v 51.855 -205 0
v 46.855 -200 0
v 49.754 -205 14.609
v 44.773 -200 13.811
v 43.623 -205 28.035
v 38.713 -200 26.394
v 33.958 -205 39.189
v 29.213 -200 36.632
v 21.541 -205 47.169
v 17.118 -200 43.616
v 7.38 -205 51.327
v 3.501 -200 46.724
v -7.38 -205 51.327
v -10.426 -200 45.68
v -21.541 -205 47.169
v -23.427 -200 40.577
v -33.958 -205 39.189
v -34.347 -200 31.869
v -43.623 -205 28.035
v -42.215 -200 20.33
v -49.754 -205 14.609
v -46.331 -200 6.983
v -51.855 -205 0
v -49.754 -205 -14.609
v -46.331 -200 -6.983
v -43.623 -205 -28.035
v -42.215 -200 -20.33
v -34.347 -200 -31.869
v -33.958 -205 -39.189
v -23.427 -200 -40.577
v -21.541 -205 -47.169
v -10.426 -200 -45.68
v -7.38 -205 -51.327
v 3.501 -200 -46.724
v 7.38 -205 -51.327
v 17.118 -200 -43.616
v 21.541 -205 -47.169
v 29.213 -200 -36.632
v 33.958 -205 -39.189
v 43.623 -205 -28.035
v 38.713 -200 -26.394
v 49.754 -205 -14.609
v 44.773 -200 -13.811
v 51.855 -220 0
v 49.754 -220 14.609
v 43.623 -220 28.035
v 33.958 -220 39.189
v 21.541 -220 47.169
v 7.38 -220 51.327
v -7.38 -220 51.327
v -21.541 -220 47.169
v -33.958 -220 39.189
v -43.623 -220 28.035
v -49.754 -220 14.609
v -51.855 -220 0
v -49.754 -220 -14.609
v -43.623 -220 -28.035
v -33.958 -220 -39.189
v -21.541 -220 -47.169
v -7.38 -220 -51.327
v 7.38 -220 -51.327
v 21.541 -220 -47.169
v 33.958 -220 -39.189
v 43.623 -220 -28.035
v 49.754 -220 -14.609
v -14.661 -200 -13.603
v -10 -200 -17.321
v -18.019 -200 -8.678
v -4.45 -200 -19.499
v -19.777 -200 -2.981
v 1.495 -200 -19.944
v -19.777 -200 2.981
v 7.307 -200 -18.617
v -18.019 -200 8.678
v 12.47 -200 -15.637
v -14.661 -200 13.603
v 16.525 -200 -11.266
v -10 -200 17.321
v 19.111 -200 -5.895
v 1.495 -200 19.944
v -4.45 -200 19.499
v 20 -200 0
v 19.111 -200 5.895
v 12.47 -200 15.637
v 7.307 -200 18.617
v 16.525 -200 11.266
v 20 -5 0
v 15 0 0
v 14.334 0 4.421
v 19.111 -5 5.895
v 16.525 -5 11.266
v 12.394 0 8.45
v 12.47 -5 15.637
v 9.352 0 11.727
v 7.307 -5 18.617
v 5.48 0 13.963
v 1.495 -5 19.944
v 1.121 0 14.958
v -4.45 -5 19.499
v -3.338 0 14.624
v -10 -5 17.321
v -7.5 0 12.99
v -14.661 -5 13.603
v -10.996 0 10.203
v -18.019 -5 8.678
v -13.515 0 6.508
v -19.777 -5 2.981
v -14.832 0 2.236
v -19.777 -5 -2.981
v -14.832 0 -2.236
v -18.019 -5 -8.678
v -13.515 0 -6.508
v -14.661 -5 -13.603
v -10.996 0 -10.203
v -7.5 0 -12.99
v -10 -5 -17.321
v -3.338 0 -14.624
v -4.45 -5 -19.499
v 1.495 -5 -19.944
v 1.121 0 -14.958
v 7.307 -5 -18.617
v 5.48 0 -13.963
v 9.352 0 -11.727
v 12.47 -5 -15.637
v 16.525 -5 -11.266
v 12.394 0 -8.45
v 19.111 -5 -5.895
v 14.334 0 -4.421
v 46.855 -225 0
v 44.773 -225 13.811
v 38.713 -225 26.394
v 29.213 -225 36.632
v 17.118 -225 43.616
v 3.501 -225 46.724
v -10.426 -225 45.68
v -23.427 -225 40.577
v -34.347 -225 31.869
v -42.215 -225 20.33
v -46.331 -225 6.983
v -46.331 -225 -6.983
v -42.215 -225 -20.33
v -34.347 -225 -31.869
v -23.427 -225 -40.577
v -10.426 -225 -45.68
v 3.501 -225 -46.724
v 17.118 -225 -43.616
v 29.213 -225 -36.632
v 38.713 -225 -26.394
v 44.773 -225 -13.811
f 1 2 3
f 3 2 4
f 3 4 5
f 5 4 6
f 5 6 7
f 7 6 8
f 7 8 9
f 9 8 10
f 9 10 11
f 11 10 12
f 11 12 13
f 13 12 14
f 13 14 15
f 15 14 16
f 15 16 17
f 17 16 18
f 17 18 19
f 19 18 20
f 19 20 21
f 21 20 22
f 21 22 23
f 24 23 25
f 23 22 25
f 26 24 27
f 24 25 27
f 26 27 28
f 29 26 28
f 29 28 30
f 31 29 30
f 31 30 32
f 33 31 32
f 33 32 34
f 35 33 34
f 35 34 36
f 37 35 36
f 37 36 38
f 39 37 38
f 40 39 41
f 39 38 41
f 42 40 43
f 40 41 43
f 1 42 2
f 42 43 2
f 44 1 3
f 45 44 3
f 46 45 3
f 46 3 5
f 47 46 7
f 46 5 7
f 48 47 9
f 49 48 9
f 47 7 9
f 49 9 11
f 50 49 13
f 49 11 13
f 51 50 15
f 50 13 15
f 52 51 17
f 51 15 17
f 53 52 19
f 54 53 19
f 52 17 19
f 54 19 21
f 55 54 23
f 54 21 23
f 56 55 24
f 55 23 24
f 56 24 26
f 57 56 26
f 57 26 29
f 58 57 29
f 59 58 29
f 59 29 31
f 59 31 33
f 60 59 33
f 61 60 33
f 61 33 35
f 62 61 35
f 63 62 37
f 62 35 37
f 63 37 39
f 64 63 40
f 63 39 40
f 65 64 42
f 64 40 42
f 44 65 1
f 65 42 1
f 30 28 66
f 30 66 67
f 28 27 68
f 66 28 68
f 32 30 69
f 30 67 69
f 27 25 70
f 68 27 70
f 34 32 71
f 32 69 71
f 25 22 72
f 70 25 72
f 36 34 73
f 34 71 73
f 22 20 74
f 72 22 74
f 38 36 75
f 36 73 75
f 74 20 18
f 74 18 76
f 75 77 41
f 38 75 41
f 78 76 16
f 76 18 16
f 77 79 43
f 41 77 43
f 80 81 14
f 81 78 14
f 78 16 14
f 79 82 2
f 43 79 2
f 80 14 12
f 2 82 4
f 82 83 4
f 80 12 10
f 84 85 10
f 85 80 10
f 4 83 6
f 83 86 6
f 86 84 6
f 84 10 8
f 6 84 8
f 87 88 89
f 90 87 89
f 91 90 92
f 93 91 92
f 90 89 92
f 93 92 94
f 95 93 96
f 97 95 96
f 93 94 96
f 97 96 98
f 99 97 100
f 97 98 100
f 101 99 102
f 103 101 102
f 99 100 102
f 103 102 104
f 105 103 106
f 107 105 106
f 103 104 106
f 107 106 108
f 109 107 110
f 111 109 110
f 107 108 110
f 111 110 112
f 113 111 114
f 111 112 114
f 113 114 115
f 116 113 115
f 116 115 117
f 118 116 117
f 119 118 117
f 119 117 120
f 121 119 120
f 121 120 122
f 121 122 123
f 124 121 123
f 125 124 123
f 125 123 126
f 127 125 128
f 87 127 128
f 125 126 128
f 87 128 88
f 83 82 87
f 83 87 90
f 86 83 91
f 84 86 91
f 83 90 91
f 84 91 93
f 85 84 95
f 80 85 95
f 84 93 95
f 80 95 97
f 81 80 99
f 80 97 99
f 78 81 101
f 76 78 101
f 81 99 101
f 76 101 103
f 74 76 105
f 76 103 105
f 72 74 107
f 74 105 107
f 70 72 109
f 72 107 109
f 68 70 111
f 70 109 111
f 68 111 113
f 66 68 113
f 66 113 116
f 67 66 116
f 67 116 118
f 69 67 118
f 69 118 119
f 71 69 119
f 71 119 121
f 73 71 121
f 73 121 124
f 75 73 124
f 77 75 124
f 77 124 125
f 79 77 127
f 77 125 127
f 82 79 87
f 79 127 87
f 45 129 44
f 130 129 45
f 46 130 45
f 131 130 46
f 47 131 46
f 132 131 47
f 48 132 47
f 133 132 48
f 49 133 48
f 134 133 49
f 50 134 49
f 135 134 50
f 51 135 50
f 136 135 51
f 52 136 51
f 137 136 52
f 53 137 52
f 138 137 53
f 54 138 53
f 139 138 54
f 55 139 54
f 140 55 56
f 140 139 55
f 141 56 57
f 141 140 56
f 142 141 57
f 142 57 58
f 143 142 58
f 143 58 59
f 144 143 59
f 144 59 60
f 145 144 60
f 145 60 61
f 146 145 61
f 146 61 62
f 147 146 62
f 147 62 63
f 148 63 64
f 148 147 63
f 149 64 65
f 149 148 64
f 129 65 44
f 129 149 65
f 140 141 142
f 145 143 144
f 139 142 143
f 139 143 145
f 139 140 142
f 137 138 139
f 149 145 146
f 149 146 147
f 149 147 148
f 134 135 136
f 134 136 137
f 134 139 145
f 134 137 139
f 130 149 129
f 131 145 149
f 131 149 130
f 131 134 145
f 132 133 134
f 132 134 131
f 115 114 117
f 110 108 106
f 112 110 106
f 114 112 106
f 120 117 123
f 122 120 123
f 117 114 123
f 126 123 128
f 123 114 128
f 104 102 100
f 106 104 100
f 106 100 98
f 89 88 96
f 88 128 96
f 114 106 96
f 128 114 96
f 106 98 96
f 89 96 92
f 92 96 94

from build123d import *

# Parameters (mm, degrees)
F0_R     = 20
F1_DEPTH = 200
F2_R     = 51.8547175937
F2_R_2   = 20
F3_DEPTH = 25
F4_SIZE  = 5
F6_START = -25
F5_R     = 7.1981981043
F6_DEPTH = 26.8557175937


with BuildPart() as f1:
    # F0 (on Front) → F1 (new body)
    with BuildSketch(Plane.XZ):
        Circle(F0_R)
    extrude(amount=F1_DEPTH)

    # F2 (on face) → F3 (join)
    with BuildSketch(Plane.XZ.offset(200)):
        Circle(F2_R)
        Circle(F2_R_2, mode=Mode.SUBTRACT)
        Circle(F2_R)
    extrude(amount=F3_DEPTH)

    # F4
    f4_edges = [f1.edges().sort_by_distance(p)[0] for p in [
        (-51.854718, -225, 0),
        (-51.854718, -200, 0),
        (-20, 0, 0),
    ]]
    chamfer(f4_edges, length=F4_SIZE)

    # F5 (on Top) → F6 (cut)
    with BuildSketch(Plane.XY.offset(F6_START)):
        with Locations((0, -18.5775626451)):
            Circle(F5_R)
    extrude(amount=-F6_DEPTH, mode=Mode.SUBTRACT)


solid = f1.part
